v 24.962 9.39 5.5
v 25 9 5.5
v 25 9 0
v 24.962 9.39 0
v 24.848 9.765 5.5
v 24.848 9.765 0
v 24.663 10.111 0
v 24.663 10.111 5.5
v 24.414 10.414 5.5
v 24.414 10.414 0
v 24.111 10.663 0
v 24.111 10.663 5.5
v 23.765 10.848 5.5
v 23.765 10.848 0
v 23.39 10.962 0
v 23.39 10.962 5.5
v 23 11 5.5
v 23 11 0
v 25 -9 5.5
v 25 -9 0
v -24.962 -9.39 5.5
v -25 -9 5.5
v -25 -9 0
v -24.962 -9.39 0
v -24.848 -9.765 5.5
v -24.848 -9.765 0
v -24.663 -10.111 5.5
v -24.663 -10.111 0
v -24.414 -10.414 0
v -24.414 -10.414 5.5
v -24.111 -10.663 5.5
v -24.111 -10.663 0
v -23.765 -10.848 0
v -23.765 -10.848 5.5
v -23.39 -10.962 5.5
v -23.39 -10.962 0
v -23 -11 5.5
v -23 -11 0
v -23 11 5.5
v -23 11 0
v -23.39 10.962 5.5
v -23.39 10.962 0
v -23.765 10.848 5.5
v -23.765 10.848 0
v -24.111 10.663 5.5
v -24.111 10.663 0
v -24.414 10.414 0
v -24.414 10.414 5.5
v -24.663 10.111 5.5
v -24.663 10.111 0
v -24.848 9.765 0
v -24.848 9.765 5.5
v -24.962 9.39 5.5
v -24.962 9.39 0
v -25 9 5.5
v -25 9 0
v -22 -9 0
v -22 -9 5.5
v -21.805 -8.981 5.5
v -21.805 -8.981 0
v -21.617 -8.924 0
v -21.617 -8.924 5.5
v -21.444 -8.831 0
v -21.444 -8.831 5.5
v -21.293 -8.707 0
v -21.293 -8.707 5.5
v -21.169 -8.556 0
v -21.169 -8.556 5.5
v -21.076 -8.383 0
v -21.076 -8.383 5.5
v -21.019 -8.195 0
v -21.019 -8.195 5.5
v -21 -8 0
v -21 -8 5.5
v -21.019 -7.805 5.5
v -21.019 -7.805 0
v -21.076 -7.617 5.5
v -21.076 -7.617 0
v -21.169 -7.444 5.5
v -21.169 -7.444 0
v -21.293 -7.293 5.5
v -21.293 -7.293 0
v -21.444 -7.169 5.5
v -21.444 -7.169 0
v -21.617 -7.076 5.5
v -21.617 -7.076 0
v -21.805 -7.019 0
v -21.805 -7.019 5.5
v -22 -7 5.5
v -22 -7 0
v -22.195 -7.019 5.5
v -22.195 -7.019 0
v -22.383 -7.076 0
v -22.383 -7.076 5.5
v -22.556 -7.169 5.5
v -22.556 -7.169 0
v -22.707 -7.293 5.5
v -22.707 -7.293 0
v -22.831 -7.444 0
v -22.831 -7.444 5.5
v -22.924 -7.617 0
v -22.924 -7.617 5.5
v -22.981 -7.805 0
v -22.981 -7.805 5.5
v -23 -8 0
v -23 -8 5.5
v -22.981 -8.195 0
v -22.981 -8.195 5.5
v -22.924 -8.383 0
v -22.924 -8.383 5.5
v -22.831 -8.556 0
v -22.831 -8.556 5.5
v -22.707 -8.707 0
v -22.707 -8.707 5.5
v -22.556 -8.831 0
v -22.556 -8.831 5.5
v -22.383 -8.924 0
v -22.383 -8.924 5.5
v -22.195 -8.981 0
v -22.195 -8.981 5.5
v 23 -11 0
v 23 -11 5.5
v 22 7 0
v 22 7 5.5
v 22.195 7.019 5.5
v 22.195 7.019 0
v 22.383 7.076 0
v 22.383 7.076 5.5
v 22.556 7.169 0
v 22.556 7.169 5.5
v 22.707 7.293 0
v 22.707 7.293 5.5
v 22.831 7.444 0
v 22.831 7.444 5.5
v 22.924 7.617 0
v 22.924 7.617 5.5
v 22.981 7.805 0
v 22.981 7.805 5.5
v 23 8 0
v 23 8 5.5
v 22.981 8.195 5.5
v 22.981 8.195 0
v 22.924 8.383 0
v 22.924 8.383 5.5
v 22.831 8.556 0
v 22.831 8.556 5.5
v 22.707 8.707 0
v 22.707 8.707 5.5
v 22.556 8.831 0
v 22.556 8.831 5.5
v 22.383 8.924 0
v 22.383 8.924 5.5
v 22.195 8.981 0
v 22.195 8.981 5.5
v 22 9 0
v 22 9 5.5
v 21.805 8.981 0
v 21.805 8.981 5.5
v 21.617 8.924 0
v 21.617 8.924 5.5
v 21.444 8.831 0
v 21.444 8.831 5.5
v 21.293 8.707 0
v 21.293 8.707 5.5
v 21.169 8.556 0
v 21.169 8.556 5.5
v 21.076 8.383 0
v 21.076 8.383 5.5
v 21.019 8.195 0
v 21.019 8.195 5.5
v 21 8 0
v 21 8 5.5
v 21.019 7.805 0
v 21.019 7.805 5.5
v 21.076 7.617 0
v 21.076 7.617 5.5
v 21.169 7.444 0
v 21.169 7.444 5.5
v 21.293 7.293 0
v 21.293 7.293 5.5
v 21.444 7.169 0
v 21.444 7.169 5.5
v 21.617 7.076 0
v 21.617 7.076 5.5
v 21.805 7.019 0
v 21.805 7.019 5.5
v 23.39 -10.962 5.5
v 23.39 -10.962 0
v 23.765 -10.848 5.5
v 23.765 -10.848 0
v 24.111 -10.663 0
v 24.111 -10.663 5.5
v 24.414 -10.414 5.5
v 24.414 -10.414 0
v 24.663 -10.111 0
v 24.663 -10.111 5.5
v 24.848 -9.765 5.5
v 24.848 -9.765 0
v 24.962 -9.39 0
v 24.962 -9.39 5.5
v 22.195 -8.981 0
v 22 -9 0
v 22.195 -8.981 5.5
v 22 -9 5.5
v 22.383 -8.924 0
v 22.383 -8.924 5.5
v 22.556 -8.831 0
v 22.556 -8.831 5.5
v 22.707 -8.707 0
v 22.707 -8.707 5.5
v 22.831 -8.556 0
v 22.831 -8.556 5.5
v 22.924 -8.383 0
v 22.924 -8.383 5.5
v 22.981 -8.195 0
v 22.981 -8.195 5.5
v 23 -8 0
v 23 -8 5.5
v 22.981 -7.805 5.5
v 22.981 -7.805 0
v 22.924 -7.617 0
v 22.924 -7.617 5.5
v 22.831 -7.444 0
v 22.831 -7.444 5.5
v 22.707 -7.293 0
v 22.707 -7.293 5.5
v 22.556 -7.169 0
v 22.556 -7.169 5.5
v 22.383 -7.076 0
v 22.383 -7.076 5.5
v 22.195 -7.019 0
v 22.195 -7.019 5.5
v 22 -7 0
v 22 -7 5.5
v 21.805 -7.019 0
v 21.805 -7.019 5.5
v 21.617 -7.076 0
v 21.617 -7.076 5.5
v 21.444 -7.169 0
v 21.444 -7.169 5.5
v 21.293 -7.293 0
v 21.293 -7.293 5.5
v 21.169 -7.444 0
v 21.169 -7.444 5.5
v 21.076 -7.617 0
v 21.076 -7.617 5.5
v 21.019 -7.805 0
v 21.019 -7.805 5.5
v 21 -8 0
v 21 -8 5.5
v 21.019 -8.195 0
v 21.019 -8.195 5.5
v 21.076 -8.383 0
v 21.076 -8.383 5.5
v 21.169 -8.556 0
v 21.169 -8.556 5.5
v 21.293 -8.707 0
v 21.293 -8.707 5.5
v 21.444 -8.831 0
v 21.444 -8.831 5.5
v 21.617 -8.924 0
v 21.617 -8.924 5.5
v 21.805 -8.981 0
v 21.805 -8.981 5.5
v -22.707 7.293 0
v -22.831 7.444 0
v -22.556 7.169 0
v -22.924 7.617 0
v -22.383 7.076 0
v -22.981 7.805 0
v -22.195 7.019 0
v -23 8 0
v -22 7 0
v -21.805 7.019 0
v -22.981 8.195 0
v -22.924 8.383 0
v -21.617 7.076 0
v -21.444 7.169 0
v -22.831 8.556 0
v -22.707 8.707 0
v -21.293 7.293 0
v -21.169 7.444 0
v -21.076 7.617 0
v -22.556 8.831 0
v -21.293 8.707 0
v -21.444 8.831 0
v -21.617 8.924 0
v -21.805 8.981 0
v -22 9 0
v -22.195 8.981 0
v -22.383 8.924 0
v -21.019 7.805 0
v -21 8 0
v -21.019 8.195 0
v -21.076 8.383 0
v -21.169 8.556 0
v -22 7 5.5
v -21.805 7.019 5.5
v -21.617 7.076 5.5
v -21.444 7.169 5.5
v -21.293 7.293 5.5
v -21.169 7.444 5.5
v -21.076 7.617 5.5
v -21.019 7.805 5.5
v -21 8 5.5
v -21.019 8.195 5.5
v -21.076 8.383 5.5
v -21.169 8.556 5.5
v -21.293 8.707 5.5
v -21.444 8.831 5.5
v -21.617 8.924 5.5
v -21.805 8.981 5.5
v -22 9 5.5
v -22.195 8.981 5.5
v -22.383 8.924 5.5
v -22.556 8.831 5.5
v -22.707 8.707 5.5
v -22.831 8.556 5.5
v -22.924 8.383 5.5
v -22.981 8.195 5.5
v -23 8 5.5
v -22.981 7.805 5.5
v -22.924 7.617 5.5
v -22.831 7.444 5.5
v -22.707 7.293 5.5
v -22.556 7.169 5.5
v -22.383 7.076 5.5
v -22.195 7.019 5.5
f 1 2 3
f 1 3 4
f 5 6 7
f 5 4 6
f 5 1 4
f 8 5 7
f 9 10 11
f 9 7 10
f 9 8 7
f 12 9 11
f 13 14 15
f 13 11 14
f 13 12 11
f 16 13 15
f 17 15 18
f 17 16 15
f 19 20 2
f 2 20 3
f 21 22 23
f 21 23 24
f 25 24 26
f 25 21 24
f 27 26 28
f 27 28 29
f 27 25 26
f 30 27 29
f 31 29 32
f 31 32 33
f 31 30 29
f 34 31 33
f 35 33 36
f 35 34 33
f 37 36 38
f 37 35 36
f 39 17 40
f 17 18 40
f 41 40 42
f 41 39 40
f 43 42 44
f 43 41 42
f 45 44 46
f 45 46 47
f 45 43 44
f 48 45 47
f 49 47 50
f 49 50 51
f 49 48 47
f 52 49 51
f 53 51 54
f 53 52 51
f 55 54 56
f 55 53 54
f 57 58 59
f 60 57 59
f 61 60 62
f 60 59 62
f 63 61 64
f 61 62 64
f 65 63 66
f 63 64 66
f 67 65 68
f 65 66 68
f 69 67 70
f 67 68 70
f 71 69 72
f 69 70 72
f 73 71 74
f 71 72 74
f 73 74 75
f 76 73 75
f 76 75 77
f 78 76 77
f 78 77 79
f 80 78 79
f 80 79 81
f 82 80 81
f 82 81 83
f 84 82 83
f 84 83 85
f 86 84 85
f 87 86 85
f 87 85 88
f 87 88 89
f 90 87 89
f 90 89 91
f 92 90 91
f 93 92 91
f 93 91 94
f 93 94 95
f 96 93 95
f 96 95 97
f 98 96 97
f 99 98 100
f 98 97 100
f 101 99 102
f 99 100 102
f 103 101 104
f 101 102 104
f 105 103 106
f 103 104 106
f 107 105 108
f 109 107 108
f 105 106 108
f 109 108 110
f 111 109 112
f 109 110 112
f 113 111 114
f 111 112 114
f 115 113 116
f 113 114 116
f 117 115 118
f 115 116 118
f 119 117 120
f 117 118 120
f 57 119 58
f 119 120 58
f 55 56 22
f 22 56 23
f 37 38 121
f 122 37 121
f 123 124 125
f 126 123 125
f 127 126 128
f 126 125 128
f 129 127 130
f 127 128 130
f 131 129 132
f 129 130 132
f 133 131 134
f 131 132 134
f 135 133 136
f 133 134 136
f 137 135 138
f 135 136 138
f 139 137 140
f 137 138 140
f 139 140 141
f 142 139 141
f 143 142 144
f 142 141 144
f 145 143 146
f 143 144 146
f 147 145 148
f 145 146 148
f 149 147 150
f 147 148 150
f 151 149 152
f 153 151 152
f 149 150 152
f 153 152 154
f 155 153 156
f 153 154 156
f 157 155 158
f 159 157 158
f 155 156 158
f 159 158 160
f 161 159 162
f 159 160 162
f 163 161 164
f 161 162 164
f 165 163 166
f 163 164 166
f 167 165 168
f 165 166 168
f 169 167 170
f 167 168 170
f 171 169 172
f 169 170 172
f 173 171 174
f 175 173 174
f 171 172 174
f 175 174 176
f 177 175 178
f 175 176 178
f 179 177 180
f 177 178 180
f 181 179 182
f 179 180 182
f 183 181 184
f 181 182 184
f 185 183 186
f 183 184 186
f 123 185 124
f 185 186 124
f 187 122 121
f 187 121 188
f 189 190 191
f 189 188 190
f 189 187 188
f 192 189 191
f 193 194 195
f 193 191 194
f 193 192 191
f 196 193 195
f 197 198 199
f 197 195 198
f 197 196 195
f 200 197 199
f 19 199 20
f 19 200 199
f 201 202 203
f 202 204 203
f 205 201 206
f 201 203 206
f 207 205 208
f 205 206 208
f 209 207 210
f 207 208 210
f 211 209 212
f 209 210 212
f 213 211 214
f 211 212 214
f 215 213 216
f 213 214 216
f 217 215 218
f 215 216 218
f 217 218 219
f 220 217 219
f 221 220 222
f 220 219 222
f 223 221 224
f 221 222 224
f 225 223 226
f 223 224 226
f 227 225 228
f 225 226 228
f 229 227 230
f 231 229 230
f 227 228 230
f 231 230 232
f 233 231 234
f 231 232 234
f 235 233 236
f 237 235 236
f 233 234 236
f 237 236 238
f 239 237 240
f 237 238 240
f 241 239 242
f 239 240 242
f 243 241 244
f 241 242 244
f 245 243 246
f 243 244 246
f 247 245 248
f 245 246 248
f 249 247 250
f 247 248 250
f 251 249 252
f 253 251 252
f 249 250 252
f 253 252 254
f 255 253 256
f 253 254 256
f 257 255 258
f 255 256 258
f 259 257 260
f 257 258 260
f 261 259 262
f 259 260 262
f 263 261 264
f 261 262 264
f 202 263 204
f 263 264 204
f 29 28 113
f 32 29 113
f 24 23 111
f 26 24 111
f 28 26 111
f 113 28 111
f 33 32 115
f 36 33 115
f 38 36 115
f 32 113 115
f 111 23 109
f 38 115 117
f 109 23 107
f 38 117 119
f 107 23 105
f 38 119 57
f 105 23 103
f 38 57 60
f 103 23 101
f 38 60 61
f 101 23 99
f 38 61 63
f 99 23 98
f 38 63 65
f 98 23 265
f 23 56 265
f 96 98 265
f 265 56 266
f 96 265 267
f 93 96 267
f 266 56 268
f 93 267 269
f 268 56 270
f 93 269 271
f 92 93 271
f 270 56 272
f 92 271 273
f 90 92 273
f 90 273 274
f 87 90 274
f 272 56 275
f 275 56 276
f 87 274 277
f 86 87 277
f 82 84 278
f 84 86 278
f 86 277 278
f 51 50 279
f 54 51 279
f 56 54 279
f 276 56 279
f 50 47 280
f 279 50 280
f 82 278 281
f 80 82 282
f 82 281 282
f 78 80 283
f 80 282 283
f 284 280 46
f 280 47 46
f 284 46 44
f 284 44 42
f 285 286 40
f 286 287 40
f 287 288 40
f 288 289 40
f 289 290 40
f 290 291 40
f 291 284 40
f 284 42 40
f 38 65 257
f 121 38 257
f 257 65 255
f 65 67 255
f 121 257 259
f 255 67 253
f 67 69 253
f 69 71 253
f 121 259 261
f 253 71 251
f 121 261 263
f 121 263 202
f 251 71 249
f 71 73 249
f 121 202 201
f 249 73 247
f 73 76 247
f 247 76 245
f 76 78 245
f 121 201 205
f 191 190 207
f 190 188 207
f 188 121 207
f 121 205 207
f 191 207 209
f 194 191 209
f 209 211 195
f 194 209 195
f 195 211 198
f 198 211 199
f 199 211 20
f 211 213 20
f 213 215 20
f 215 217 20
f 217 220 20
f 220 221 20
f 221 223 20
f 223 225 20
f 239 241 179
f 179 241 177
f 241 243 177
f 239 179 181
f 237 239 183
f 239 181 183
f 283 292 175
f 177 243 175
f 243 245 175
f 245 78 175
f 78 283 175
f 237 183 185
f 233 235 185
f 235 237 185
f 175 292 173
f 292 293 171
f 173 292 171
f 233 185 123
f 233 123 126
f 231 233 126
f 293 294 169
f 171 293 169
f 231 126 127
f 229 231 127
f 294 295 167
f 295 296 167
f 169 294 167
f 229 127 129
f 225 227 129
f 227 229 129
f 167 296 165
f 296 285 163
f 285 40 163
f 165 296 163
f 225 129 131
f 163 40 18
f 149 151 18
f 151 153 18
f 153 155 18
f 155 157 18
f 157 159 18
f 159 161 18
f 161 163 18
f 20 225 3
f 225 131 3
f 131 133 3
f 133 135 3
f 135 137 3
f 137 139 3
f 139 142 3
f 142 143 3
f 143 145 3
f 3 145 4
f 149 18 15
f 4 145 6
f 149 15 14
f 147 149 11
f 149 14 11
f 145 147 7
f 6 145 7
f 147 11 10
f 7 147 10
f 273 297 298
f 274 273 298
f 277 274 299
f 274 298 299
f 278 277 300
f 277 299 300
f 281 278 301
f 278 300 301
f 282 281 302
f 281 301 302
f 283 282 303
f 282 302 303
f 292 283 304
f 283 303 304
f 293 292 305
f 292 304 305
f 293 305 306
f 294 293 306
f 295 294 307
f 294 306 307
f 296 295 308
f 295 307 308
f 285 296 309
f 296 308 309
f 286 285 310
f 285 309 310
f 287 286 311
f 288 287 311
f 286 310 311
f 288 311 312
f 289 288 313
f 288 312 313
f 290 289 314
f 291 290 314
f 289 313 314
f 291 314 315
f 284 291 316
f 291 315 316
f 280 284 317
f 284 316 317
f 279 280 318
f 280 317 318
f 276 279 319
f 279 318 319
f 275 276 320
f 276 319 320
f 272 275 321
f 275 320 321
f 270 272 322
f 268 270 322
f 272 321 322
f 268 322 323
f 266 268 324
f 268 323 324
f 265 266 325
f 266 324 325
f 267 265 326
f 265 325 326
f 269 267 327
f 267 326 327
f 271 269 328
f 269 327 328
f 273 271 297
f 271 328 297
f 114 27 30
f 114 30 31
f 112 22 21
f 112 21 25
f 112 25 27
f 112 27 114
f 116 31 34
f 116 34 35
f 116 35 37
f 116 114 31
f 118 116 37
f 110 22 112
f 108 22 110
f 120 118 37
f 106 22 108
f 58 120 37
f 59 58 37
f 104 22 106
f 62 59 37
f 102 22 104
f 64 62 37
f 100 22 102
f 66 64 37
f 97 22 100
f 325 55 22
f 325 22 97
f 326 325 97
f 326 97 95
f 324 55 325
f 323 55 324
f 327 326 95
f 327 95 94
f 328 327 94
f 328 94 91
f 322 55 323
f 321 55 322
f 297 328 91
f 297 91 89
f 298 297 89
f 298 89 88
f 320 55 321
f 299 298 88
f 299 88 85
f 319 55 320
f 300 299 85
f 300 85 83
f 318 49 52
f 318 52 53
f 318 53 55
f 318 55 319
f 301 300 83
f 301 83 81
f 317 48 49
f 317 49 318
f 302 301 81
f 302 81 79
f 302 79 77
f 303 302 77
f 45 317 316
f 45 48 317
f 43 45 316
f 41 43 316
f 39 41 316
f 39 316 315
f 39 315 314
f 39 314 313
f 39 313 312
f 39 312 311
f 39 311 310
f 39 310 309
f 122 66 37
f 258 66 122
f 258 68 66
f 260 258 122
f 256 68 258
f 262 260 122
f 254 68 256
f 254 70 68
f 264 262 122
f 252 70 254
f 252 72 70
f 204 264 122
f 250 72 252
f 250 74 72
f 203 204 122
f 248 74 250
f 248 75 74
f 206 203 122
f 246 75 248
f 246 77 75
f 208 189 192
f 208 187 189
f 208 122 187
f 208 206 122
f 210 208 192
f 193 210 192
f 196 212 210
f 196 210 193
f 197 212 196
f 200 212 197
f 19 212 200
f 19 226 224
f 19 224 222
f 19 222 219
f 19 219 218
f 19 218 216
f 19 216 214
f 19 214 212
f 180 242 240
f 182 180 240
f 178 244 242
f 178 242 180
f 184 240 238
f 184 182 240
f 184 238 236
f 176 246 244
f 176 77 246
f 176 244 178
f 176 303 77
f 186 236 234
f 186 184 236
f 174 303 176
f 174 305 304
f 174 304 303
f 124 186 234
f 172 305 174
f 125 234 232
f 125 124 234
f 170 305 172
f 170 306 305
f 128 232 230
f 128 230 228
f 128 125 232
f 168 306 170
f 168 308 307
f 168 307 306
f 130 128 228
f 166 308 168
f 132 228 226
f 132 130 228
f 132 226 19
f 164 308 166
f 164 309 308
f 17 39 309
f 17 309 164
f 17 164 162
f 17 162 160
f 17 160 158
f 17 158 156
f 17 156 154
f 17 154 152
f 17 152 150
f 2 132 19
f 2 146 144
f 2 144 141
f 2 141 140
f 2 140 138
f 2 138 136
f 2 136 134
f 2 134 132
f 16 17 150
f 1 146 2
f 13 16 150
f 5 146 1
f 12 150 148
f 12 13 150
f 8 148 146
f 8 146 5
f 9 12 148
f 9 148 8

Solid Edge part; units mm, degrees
sketch "Sketch1" plane through (0, 0, 0) normal (0, 0, 1) x (1, 0, 0)
  line L0 (25, 11) -> (-25, 11)
  line L1 (-25, 11) -> (-25, -11)
  line L2 (-25, -11) -> (25, -11)
  line L3 (25, -11) -> (25, 11)
  dimension "D1" = 50
  dimension "D2" = 22
extrude "Protrusion1" add sketch "Sketch1" along normal blind 5.5
hole "Hole_1" at (-22, 8, 5.5) direction (0, 0, -1) diameter 2 end through all
hole "Hole1" at (-22, -8, 5.5) direction (0, 0, -1) diameter 2 end through all
hole "Hole2" at (22, -8, 5.5) direction (0, 0, -1) diameter 2 end through all
hole "Hole3" at (22, 8, 5.5) direction (0, 0, -1) diameter 2 end through all
fillet "Round_1" radius 2 4 edges at (-25, 11, 2.75) (-25, -11, 2.75) (25, -11, 2.75) (25, 11, 2.75)
properties material "木材, アッシュ"
